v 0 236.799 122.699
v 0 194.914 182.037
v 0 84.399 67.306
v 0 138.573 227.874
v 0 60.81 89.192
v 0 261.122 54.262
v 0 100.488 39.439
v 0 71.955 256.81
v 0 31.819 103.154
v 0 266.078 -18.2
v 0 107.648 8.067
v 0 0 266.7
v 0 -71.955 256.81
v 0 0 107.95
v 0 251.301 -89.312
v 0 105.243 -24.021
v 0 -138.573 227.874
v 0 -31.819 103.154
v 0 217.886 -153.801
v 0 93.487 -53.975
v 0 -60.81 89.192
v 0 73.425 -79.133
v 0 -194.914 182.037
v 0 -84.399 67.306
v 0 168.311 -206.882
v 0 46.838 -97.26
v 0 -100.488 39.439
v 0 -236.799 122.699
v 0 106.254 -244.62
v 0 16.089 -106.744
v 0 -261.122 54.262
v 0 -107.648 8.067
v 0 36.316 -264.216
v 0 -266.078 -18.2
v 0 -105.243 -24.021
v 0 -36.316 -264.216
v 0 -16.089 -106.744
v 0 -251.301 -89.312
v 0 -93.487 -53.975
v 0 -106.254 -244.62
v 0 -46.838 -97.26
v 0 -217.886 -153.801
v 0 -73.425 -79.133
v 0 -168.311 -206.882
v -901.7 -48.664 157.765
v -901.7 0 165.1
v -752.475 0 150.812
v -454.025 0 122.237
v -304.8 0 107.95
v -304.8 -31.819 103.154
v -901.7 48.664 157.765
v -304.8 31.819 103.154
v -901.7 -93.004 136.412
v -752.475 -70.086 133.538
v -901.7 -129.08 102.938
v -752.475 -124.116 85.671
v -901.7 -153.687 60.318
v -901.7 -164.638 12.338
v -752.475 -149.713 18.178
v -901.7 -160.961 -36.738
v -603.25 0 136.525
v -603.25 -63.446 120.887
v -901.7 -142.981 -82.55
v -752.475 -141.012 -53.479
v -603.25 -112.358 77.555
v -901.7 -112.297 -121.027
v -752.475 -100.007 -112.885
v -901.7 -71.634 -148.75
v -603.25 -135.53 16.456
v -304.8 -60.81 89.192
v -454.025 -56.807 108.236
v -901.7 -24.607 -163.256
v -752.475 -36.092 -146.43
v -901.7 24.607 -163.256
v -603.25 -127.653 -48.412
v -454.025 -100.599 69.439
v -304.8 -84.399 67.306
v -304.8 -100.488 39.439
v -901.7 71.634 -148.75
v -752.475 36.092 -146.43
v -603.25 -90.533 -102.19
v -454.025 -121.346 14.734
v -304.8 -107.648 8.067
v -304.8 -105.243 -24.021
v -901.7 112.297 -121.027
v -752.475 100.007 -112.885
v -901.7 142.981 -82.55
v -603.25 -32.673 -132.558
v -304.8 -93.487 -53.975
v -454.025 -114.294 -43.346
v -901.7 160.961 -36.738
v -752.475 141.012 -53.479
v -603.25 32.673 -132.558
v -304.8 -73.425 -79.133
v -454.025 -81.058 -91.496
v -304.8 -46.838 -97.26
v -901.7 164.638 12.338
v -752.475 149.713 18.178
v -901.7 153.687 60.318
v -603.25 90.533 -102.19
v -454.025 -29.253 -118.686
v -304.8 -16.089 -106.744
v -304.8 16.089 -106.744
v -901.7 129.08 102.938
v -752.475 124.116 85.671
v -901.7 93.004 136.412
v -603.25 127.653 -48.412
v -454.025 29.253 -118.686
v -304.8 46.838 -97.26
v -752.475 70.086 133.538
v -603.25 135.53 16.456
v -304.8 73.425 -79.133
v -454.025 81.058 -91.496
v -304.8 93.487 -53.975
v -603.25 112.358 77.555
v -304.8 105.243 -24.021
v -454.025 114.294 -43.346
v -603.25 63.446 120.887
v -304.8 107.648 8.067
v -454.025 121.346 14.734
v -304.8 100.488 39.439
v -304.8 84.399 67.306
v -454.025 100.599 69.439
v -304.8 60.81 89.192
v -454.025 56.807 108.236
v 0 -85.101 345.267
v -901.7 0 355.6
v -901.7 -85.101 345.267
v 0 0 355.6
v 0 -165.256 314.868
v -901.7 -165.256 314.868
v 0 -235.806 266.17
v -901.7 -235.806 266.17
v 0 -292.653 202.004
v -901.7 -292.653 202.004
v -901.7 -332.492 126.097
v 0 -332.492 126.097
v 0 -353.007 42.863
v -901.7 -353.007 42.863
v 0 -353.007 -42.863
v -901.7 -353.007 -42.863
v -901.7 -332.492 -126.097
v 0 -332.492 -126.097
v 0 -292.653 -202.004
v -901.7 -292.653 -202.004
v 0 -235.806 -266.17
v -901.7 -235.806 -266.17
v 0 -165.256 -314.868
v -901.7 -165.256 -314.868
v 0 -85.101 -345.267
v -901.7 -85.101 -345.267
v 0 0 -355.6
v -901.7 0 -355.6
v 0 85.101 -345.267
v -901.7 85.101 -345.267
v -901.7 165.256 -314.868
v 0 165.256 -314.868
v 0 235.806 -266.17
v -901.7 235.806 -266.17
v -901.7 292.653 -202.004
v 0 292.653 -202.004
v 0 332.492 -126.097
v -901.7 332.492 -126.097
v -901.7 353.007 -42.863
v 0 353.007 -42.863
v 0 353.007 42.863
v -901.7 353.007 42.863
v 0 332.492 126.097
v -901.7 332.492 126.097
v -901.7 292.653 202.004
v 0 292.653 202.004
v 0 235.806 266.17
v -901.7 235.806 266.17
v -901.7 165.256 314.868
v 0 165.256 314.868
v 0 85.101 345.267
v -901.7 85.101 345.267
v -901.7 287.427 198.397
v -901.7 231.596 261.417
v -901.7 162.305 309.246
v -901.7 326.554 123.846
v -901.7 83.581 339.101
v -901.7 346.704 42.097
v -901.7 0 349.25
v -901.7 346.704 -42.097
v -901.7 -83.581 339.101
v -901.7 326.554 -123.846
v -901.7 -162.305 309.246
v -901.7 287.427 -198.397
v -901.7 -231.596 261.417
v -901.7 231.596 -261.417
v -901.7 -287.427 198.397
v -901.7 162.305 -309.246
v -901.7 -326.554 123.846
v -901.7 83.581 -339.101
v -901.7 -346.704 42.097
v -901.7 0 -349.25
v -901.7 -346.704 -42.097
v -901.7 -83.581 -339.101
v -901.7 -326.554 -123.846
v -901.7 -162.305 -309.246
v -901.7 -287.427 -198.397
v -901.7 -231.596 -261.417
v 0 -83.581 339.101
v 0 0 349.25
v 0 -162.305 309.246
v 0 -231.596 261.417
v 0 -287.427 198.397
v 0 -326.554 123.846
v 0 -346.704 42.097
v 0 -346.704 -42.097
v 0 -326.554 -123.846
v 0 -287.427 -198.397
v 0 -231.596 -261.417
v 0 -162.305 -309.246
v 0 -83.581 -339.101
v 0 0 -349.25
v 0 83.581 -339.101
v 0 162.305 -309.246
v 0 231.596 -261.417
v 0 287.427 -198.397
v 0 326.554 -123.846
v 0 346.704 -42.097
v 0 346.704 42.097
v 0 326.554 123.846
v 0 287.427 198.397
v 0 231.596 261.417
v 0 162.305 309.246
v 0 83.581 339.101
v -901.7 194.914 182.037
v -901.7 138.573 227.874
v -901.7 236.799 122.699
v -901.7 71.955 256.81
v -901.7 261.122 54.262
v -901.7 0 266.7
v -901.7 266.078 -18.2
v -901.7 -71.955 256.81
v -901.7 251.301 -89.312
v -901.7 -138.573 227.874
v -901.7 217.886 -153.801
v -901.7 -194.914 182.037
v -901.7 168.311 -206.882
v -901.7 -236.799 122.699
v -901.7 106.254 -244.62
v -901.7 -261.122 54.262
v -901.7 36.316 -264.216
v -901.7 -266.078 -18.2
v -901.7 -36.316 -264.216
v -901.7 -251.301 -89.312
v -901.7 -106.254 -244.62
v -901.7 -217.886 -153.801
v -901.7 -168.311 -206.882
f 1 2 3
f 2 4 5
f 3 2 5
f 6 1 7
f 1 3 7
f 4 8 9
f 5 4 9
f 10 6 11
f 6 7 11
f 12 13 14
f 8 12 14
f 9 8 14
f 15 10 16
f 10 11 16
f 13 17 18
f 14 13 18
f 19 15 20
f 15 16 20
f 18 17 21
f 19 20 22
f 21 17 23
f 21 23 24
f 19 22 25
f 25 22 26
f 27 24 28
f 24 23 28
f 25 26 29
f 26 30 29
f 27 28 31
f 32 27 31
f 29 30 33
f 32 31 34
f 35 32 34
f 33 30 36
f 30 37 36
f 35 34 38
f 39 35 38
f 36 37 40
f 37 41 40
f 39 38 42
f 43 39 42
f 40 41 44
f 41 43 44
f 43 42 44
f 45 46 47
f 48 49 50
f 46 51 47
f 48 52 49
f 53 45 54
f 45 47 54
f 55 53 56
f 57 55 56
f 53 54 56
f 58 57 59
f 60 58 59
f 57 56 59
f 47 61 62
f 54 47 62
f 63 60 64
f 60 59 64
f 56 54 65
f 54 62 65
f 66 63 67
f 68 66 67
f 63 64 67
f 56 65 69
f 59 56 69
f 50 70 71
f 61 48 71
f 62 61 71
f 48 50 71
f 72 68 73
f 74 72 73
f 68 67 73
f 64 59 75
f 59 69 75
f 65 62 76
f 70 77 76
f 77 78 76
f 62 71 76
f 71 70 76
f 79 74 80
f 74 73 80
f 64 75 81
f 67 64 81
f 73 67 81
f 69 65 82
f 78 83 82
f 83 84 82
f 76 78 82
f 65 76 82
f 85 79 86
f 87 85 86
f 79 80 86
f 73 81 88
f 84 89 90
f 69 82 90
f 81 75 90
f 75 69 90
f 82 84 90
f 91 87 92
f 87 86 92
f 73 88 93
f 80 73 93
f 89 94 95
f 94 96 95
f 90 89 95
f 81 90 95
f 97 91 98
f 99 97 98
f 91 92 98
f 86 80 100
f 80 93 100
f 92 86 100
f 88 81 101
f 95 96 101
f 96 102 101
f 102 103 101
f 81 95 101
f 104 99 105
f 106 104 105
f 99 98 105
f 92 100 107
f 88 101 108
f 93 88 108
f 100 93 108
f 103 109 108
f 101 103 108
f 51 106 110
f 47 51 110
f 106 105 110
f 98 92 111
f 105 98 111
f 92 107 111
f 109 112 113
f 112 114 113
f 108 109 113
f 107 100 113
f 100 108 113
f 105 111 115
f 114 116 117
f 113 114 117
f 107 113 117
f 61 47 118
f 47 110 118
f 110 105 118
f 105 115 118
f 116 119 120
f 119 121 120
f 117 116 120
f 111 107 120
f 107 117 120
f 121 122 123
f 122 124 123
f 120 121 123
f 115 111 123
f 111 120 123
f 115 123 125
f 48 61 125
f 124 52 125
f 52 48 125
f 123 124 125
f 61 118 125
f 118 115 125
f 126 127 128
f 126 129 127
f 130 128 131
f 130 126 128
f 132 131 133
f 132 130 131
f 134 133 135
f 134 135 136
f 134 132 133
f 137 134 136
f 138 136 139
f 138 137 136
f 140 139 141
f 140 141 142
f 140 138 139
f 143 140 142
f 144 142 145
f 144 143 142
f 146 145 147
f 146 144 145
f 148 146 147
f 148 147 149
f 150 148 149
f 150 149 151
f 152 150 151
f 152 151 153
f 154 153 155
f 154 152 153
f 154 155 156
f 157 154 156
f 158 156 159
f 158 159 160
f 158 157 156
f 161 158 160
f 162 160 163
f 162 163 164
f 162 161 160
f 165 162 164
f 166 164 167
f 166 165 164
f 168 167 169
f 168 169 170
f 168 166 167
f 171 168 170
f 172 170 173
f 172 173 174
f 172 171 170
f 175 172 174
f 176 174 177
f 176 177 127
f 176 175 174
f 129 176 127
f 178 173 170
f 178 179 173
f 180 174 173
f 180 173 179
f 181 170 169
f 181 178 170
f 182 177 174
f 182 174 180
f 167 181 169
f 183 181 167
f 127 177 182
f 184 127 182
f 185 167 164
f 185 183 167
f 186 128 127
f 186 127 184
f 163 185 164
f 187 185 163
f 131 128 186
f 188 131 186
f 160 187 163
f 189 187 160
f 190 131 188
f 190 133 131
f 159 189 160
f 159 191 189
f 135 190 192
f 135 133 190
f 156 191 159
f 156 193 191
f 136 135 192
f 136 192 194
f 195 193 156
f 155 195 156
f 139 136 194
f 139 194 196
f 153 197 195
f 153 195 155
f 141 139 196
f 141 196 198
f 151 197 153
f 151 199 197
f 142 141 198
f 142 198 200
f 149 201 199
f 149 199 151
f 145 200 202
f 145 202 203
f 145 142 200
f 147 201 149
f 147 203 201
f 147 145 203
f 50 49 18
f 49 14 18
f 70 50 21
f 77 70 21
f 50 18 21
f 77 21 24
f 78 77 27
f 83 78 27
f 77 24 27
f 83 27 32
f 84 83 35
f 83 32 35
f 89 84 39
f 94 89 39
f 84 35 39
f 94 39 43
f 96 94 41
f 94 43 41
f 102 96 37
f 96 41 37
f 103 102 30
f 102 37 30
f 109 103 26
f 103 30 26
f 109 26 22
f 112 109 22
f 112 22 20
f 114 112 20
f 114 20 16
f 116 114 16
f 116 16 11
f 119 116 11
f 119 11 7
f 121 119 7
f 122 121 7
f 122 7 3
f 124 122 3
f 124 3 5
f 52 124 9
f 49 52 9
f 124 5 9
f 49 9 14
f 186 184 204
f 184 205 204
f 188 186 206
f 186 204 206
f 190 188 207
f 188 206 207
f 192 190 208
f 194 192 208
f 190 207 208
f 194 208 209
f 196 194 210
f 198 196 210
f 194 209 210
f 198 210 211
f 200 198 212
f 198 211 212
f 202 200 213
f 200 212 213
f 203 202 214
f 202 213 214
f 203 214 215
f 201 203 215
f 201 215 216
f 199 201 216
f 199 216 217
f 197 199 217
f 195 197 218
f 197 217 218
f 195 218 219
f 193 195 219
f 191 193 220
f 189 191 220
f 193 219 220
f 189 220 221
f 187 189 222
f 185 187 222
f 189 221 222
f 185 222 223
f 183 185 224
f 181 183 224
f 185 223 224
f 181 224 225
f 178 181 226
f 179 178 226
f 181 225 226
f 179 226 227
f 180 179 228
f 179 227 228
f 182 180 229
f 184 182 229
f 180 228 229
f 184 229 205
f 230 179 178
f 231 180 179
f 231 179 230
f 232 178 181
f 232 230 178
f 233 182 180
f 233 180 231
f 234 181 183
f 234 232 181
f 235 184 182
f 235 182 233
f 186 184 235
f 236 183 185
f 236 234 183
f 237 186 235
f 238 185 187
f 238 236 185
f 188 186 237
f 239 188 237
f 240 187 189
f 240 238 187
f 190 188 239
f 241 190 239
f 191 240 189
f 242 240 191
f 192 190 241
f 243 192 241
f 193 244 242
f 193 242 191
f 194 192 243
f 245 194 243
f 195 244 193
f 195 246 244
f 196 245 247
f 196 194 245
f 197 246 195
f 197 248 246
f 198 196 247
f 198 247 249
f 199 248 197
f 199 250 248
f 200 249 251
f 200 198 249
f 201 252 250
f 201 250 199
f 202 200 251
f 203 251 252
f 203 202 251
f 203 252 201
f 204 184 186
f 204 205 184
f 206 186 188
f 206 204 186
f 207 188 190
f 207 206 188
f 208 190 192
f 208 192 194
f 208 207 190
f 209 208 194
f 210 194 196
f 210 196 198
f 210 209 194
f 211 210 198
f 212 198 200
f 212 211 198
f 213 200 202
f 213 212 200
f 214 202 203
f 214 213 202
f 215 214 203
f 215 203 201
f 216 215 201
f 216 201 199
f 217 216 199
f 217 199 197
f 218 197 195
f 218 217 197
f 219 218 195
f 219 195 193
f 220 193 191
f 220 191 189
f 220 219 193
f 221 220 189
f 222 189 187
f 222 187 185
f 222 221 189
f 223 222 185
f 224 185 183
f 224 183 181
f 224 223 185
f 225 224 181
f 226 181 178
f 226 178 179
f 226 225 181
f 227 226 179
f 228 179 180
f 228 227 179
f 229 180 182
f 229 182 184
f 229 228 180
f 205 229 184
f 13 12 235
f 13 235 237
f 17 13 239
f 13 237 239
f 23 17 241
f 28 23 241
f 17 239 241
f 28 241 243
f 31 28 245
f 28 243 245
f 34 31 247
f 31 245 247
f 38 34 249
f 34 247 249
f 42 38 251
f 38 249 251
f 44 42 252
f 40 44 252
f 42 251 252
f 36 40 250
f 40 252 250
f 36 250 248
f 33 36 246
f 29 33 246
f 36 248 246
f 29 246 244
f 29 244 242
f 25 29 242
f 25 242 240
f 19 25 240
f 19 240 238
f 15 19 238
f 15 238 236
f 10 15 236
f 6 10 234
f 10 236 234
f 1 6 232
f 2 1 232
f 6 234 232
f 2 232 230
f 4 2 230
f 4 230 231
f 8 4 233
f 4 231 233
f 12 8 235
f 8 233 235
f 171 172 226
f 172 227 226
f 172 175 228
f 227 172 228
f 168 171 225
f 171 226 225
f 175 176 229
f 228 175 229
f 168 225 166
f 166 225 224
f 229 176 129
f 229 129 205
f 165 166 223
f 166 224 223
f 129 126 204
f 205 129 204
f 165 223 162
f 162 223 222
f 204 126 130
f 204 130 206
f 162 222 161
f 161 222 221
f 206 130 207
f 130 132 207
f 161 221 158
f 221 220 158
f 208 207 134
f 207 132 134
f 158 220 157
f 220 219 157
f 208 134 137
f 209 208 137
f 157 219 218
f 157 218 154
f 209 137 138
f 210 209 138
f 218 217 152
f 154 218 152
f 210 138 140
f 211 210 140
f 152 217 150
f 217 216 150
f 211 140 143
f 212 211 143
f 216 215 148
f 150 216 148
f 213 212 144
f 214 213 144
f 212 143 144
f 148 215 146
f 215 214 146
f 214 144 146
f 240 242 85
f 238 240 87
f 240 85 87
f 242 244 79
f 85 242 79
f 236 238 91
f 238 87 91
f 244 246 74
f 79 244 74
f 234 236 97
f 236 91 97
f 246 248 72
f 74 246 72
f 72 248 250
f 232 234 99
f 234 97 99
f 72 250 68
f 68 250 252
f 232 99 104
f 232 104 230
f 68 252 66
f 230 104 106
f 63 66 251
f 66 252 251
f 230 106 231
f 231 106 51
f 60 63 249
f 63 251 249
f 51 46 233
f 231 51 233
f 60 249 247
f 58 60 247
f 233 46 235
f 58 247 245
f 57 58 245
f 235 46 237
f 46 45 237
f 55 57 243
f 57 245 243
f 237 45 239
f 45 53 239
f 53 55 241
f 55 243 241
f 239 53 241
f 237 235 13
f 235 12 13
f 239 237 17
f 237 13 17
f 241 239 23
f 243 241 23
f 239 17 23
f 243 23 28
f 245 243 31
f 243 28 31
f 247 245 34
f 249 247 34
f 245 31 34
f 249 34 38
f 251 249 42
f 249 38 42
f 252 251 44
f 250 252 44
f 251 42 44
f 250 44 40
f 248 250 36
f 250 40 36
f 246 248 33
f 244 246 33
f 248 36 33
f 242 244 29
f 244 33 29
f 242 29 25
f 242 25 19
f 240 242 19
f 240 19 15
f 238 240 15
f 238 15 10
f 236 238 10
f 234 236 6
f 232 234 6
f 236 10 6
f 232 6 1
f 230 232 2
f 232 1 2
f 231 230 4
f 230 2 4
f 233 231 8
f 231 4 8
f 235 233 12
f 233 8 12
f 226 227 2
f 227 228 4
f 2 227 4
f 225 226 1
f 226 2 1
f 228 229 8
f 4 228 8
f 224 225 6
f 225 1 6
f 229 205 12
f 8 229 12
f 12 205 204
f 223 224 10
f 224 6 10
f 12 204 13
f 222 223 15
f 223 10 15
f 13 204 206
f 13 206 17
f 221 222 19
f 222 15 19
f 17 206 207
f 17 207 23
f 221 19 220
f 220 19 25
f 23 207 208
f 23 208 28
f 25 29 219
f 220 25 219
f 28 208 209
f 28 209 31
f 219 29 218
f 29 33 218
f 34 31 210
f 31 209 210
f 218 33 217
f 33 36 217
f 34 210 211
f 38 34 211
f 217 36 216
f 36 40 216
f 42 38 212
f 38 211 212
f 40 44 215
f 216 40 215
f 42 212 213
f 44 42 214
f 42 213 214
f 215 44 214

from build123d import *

# Parameters (mm, degrees)
F0_W   = 901.7
F0_H   = 6.35
F0_H_2 = 82.55


with BuildPart() as f1:
    # F0 (on Front) → F1 (revolve)
    with BuildSketch(Plane.XZ):
        with Locations((-450.85, 352.425)):
            Rectangle(F0_W, F0_H)
    revolve(axis=Axis((-0.751264, 0, 0), (1, 0, 0)))


with BuildPart() as f2:
    # F0 (on Front) → F2 (revolve)
    with BuildSketch(Plane.XZ):
        with Locations((-450.85, 307.975)):
            Rectangle(F0_W, F0_H_2)
    revolve(axis=Axis((-0.751264, 0, 0), (1, 0, 0)))


with BuildPart() as f3:
    # F0 (on Front) → F3 (revolve)
    with BuildSketch(Plane.XZ):
        Polygon((-304.8, 107.95), (0, 107.95), (0, 266.7), (-901.7, 266.7), (-901.7, 165.1), align=None)
    revolve(axis=Axis((-0.751264, 0, 0), (1, 0, 0)))


solid = Compound([f1.part, f2.part, f3.part])
